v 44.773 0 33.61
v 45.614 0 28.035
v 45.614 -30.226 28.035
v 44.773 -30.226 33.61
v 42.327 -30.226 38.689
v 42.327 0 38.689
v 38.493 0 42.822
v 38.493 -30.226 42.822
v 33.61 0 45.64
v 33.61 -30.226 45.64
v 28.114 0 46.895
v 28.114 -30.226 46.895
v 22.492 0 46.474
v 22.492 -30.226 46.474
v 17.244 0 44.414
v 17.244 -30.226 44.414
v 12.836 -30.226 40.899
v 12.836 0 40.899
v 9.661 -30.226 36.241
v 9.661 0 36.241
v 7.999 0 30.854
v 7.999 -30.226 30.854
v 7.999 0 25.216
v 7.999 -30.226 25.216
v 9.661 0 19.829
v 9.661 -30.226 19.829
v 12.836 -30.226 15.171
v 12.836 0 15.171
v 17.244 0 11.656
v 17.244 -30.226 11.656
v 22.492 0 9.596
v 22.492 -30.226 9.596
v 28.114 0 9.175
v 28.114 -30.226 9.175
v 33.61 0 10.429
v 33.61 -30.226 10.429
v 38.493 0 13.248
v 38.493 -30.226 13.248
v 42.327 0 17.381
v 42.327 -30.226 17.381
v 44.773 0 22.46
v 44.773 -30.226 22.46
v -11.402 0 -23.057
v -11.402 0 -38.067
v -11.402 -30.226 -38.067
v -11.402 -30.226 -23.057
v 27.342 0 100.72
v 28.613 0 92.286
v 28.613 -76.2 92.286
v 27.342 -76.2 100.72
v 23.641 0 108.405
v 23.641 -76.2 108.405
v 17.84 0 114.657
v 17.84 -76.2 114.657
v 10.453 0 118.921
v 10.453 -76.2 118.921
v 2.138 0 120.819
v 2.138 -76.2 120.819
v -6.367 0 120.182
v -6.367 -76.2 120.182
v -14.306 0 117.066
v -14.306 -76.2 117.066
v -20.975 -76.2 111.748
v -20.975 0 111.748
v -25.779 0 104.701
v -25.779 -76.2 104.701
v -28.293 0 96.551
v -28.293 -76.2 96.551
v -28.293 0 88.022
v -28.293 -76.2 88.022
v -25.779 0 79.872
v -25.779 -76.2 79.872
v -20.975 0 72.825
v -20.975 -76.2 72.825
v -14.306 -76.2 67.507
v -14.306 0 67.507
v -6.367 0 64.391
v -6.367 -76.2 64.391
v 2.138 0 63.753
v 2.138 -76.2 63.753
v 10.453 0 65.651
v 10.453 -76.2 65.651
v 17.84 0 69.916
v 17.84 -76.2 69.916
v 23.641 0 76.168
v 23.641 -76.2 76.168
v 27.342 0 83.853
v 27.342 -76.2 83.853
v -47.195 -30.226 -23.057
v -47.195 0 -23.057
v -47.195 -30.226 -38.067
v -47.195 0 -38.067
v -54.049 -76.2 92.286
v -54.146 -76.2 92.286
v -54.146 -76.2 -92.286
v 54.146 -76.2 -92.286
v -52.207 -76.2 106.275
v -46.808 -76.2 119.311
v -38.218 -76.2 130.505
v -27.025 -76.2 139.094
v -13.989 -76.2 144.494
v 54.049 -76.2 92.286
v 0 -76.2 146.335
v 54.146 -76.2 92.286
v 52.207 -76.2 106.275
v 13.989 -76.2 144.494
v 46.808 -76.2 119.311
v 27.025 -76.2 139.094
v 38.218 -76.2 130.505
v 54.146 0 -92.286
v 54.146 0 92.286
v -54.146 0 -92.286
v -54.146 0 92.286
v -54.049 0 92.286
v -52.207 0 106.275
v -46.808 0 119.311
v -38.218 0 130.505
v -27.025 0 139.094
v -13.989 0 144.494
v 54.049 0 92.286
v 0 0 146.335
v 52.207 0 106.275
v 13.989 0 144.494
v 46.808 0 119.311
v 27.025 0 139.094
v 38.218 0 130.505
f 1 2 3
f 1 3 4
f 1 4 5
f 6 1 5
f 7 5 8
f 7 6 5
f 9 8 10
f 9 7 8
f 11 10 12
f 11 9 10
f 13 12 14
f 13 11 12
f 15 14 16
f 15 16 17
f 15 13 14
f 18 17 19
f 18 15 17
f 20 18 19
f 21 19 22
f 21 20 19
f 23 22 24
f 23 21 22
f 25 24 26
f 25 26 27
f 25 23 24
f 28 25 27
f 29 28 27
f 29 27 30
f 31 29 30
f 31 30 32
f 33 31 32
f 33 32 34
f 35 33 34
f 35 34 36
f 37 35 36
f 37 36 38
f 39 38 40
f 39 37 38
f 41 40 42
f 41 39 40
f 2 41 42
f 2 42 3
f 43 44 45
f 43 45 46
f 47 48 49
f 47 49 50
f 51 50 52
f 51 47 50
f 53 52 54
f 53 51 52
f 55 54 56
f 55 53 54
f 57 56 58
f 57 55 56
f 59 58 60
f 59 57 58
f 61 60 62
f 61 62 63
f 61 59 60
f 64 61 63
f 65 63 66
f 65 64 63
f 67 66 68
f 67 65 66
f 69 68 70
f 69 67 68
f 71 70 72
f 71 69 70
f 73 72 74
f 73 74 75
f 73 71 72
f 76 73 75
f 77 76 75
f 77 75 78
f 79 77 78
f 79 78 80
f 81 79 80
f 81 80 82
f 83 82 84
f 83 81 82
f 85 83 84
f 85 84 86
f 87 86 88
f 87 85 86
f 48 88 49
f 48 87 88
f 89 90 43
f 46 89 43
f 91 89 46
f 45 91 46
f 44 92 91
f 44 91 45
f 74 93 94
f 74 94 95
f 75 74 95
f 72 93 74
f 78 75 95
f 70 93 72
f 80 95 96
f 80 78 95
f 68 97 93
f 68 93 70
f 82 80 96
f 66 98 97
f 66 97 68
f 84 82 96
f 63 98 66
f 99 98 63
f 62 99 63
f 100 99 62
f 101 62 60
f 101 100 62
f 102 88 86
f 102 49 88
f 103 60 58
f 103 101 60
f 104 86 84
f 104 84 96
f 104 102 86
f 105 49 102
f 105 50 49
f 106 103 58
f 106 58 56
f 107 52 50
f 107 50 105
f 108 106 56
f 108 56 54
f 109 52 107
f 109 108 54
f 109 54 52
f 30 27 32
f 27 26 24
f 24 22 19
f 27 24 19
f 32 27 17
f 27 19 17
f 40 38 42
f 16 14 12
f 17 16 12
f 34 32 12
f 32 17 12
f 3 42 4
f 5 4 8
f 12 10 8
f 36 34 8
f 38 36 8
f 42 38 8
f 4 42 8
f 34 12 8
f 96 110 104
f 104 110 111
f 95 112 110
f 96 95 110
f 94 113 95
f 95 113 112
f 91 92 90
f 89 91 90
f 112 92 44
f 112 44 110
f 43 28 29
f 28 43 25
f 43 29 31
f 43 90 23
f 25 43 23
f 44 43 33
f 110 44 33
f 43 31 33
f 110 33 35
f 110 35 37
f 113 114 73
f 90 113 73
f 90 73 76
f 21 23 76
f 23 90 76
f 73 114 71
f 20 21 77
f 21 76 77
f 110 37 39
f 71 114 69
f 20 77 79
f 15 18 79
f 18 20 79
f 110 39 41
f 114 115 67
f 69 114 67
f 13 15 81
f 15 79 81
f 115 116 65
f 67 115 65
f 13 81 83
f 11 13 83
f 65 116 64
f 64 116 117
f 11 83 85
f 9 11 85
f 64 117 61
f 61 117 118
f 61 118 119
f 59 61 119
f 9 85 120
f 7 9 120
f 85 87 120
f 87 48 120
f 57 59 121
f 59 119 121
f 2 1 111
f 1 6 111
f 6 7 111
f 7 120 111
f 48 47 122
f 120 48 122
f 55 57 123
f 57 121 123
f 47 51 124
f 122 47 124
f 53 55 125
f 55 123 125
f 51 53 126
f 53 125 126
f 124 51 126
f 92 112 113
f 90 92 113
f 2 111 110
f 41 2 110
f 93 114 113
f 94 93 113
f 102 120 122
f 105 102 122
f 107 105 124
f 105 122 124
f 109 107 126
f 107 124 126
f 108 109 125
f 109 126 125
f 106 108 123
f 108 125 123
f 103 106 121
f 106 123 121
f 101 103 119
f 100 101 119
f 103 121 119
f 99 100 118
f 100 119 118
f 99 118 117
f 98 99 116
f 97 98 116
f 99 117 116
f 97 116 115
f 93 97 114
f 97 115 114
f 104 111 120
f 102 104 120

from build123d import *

# Parameters (mm, degrees)
F0_R     = 28.612942
F1_DEPTH = 76.2
F3_W     = 35.79326
F3_H     = 15.010085
F2_R     = 18.912984
F4_DEPTH = 30.226


with BuildPart() as f1:
    # F0 (on Front) → F1 (new body)
    with BuildSketch(Plane.XZ):
        with BuildLine():
            Line((-54.049077, 92.286333), (-54.145753, 92.286333))
            Line((-54.145753, 92.286333), (-54.145753, -92.286333))
            Line((-54.145753, -92.286333), (54.145753, -92.286333))
            Line((54.145753, -92.286333), (54.145753, 92.286333))
            Line((54.145753, 92.286333), (54.049077, 92.286333))
            ThreePointArc((54.049077, 92.286333), (0, 146.335411), (-54.049077, 92.286333))
        make_face()
        with Locations((0, 92.286333)):
            Circle(F0_R, mode=Mode.SUBTRACT)
    extrude(amount=F1_DEPTH)

    # F3 (on Front) + F2 (on Front) → F4 (cut)
    with BuildSketch(Plane.XZ):
        with Locations((-29.298518, -30.562203)):
            Rectangle(F3_W, F3_H)
    with BuildSketch(Plane.XZ):
        with Locations((26.700616, 28.03483)):
            Circle(F2_R)
    extrude(amount=F4_DEPTH, mode=Mode.SUBTRACT)


solid = f1.part
